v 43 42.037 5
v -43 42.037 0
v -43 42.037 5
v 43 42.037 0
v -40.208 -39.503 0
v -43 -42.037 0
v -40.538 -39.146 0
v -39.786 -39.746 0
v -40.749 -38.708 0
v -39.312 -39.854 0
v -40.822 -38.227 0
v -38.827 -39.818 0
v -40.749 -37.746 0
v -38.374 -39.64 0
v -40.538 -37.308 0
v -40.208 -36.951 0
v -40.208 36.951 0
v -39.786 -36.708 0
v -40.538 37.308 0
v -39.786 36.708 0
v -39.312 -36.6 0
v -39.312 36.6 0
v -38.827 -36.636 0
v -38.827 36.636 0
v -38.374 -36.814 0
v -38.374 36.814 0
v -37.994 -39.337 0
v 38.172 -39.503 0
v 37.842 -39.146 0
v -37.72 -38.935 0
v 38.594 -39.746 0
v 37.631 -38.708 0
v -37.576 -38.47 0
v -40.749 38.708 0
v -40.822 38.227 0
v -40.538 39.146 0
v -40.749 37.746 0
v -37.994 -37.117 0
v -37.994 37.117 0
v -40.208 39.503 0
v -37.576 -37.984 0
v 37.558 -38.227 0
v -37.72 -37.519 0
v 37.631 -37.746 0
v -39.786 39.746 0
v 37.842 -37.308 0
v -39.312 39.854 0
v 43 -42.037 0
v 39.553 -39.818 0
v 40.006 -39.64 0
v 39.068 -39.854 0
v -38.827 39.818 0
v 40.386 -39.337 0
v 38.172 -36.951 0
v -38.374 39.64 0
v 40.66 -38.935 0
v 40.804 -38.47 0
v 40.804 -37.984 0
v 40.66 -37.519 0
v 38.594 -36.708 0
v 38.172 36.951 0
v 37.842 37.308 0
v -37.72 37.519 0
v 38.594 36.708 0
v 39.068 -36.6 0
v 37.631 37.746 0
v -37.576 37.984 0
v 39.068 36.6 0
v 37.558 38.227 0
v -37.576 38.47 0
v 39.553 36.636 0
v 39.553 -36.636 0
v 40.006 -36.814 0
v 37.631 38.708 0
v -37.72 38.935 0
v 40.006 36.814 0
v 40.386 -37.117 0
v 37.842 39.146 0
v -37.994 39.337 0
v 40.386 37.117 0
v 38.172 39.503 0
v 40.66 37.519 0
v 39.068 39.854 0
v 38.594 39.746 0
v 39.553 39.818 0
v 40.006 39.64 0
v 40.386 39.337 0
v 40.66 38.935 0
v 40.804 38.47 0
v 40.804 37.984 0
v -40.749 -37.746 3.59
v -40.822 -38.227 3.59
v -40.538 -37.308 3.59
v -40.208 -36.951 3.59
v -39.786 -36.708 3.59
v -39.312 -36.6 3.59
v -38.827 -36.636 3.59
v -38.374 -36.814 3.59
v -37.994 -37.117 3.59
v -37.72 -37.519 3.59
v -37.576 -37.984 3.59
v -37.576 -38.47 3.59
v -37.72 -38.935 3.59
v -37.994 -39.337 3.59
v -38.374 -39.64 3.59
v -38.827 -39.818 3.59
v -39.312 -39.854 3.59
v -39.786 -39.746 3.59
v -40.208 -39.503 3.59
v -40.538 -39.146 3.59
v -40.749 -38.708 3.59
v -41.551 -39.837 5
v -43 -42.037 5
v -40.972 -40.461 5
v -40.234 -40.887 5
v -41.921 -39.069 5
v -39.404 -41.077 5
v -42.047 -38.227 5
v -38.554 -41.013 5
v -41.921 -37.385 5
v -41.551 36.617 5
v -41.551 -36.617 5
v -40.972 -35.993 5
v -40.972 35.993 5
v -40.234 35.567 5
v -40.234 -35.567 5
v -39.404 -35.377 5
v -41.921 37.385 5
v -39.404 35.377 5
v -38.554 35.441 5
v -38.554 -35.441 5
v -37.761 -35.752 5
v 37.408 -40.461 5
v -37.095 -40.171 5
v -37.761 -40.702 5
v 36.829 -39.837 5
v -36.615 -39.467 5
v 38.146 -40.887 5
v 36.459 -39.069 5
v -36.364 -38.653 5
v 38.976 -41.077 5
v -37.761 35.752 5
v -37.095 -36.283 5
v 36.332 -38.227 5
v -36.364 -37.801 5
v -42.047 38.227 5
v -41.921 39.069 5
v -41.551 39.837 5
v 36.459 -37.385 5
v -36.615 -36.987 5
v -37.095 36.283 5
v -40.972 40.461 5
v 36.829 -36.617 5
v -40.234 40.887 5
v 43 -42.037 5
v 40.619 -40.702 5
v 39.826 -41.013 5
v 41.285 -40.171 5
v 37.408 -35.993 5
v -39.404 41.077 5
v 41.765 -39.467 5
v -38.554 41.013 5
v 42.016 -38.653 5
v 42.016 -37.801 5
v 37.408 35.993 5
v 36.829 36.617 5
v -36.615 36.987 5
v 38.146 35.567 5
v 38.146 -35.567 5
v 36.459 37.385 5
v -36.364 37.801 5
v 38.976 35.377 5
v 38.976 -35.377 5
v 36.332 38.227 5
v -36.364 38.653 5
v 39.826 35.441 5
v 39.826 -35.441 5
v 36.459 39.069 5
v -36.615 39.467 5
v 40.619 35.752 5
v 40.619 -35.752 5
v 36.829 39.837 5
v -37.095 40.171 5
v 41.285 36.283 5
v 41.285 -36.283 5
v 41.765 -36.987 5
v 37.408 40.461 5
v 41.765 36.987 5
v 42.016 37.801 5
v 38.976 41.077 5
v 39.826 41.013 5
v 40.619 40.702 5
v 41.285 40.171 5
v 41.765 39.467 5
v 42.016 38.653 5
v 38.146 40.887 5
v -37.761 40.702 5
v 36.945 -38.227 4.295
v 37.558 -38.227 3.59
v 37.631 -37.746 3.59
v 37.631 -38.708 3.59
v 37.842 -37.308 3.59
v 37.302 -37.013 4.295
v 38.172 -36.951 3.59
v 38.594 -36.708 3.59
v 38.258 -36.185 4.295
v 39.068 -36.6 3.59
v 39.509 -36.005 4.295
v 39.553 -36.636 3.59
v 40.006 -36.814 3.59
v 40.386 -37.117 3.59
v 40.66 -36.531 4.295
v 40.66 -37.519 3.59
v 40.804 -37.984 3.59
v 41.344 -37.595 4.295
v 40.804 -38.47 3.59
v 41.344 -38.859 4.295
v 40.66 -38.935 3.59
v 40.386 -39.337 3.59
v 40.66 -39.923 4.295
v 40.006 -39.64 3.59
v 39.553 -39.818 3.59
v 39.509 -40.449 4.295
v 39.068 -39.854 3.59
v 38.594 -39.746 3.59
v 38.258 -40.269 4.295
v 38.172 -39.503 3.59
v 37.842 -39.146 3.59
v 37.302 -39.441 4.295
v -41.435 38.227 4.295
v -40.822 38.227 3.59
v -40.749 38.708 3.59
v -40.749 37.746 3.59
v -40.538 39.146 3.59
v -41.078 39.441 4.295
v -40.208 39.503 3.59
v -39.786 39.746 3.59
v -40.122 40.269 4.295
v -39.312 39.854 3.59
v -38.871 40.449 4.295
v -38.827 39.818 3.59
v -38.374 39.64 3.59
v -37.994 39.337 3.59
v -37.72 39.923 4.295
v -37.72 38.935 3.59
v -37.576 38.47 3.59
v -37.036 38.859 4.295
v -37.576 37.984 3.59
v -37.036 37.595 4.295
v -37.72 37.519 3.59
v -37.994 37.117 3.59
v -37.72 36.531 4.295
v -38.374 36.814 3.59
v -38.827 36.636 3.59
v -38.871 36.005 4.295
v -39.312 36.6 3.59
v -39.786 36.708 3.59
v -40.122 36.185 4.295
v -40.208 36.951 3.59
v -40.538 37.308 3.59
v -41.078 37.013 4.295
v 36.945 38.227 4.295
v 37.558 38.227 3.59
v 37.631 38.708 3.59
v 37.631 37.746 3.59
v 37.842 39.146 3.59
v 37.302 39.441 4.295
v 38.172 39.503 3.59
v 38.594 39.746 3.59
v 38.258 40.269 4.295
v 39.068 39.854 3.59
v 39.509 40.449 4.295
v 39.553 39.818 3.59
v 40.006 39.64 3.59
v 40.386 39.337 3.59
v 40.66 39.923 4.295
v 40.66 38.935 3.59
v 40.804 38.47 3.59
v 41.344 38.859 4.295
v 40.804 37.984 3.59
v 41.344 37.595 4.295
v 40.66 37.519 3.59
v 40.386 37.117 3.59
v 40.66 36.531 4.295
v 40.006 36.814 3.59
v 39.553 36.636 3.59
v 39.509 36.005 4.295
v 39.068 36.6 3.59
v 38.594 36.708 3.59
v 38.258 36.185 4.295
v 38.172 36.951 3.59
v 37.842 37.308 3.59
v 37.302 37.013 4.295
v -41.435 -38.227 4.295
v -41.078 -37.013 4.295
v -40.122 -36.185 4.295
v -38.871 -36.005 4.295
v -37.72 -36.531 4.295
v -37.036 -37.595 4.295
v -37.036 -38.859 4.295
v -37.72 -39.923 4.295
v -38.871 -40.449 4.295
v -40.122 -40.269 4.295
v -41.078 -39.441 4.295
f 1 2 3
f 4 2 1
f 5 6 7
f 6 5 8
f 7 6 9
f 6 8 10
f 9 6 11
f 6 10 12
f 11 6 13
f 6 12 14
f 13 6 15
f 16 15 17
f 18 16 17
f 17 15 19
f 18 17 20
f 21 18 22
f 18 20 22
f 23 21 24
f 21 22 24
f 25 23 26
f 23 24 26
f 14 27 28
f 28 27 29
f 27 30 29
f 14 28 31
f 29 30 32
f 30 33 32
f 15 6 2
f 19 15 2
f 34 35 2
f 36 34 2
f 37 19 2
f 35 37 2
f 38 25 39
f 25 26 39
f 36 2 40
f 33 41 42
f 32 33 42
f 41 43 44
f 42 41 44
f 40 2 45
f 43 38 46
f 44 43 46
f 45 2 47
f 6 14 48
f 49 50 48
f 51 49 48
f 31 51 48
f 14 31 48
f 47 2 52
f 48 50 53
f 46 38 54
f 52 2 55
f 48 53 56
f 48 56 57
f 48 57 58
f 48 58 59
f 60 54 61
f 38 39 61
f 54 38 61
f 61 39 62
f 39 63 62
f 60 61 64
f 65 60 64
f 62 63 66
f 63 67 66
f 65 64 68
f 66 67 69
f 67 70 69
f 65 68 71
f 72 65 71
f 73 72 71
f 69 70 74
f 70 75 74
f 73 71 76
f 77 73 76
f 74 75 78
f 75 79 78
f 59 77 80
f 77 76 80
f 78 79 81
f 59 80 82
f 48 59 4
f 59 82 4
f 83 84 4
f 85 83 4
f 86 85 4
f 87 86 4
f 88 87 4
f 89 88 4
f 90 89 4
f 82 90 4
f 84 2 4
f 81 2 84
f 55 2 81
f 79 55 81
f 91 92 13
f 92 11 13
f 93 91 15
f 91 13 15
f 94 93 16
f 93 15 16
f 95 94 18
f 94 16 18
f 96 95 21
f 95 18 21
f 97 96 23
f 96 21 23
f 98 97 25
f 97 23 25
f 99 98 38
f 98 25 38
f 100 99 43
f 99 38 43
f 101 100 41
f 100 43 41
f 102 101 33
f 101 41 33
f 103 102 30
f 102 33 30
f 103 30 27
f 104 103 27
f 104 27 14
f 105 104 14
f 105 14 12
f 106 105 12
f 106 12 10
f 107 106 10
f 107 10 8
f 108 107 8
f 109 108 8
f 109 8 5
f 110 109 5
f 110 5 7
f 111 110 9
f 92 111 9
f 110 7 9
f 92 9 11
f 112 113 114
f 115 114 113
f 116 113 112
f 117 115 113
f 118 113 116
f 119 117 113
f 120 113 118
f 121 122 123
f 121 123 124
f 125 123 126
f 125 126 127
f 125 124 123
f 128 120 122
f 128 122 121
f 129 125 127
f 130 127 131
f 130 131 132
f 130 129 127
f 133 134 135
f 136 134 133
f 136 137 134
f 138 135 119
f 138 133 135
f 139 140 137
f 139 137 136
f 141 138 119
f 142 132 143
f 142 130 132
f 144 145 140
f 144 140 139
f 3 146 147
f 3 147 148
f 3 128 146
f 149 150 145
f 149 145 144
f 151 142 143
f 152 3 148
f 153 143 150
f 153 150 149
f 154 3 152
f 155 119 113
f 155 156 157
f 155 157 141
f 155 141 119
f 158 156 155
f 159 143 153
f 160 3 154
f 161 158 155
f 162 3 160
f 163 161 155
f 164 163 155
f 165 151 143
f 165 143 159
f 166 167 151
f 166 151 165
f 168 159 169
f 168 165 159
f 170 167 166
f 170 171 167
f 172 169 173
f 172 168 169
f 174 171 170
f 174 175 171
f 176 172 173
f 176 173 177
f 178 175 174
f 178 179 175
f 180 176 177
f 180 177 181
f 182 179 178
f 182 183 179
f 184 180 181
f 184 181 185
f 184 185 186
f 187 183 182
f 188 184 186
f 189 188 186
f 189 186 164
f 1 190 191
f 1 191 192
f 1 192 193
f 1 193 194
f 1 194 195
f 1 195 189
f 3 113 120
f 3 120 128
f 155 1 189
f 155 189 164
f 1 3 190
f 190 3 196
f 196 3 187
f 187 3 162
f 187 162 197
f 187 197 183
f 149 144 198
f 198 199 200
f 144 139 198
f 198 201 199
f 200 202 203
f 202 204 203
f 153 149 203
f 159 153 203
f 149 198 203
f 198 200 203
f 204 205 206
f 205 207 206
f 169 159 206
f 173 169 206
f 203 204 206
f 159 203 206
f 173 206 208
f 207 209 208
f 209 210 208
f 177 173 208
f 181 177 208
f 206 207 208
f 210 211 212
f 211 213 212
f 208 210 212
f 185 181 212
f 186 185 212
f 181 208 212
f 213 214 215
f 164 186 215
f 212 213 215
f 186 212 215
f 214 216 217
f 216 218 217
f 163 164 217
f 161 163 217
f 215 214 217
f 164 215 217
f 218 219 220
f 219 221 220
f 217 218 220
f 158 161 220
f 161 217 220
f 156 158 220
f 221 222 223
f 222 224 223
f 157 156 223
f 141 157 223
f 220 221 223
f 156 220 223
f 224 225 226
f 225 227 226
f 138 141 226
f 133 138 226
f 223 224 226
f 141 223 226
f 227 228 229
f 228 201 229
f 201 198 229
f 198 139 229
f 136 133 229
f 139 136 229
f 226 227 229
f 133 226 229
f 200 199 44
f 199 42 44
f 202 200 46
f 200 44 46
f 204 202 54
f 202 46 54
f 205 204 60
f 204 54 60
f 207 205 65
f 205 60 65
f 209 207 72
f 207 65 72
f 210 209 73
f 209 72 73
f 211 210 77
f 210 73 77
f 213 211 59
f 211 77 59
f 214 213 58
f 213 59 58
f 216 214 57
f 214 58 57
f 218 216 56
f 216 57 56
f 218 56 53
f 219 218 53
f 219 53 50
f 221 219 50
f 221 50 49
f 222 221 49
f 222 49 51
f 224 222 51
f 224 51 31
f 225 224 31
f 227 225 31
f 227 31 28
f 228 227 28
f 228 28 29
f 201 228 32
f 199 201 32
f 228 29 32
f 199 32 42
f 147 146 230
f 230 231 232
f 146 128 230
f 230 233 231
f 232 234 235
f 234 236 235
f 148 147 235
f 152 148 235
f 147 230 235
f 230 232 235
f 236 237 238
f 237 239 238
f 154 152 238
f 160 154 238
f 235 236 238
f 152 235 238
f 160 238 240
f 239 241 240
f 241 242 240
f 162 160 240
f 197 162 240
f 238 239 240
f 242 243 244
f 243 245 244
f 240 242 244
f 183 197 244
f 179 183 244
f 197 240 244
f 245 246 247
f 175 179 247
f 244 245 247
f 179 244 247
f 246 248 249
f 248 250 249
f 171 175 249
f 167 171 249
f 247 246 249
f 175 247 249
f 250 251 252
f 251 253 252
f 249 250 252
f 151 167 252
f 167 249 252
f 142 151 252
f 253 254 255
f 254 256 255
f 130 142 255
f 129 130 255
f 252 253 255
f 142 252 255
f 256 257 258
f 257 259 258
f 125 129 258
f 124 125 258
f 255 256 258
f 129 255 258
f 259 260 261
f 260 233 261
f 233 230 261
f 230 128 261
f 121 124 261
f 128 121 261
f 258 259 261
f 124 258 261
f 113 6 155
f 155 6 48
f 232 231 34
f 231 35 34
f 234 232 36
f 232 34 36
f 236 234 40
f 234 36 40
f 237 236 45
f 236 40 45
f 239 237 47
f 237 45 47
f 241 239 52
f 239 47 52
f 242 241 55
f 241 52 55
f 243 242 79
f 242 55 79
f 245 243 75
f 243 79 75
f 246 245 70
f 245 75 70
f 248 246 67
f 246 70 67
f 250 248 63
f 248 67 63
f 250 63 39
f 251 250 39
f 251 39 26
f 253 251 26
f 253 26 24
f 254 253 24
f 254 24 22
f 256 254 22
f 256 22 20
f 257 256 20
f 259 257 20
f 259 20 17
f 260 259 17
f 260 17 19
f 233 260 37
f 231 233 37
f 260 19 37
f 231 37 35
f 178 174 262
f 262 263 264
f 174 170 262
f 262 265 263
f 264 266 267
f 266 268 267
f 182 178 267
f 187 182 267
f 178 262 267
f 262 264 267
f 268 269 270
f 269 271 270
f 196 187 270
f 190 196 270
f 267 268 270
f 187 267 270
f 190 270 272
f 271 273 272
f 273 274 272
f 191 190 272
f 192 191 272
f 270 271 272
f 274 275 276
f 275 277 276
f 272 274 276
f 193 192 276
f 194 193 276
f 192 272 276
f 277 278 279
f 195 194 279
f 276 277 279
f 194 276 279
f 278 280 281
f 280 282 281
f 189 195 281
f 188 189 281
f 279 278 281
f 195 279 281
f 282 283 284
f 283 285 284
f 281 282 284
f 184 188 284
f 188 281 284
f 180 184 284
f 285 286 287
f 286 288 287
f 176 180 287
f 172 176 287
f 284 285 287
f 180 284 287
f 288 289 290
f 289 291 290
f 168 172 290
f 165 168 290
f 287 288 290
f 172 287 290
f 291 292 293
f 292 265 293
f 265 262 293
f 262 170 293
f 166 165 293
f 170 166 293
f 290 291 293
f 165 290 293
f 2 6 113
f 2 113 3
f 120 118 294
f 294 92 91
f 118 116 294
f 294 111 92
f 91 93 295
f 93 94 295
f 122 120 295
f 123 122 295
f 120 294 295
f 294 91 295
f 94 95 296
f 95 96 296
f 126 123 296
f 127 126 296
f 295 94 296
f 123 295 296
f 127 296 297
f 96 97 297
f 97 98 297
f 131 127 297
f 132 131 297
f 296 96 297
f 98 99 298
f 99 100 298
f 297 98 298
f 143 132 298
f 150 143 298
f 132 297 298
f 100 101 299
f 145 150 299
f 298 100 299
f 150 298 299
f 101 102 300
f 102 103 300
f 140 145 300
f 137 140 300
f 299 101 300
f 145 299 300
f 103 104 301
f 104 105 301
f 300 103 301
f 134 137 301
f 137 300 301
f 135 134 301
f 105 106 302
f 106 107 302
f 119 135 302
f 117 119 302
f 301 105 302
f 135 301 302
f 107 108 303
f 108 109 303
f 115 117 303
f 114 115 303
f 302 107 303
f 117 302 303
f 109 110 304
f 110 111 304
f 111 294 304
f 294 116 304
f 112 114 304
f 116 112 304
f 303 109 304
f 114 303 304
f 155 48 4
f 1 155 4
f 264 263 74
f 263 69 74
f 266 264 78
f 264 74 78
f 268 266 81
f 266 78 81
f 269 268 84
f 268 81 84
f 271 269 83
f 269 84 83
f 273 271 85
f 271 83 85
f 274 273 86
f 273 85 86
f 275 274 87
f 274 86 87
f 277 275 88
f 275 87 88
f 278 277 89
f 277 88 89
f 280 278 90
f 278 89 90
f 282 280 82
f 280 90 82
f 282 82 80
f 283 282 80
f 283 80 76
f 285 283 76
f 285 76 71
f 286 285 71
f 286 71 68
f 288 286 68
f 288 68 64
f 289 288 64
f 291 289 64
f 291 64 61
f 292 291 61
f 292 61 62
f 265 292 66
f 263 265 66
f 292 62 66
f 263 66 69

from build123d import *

# Parameters (mm, degrees)
SKETCH1_W                                      = 85.999999704
SKETCH1_H                                      = 84.074
BOSS_EXTRUDE1_DEPTH                            = 4.999999906
CSK_FOR_4_FLAT_HEAD_MACHINE_SCREW1_D           = 3.2639
CSK_FOR_4_FLAT_HEAD_MACHINE_SCREW1_CSINK_D     = 5.715
CSK_FOR_4_FLAT_HEAD_MACHINE_SCREW1_CSINK_ANGLE = 82


with BuildPart() as part:
    # Sketch1 → Boss-Extrude1 (new body)
    with BuildSketch(Plane.XY):
        Rectangle(SKETCH1_W, SKETCH1_H)
    extrude(amount=BOSS_EXTRUDE1_DEPTH)

    # CSK for #4 Flat Head Machine Screw1 (through all)
    with Locations(Plane.XY.offset(4.999999906)):
        with Locations((-39.189999852, 38.227), (39.189999852, 38.227), (-39.189999852, -38.227), (39.189999852, -38.227)):
            CounterSinkHole(CSK_FOR_4_FLAT_HEAD_MACHINE_SCREW1_D / 2, CSK_FOR_4_FLAT_HEAD_MACHINE_SCREW1_CSINK_D / 2, counter_sink_angle=CSK_FOR_4_FLAT_HEAD_MACHINE_SCREW1_CSINK_ANGLE)


solid = part.part
